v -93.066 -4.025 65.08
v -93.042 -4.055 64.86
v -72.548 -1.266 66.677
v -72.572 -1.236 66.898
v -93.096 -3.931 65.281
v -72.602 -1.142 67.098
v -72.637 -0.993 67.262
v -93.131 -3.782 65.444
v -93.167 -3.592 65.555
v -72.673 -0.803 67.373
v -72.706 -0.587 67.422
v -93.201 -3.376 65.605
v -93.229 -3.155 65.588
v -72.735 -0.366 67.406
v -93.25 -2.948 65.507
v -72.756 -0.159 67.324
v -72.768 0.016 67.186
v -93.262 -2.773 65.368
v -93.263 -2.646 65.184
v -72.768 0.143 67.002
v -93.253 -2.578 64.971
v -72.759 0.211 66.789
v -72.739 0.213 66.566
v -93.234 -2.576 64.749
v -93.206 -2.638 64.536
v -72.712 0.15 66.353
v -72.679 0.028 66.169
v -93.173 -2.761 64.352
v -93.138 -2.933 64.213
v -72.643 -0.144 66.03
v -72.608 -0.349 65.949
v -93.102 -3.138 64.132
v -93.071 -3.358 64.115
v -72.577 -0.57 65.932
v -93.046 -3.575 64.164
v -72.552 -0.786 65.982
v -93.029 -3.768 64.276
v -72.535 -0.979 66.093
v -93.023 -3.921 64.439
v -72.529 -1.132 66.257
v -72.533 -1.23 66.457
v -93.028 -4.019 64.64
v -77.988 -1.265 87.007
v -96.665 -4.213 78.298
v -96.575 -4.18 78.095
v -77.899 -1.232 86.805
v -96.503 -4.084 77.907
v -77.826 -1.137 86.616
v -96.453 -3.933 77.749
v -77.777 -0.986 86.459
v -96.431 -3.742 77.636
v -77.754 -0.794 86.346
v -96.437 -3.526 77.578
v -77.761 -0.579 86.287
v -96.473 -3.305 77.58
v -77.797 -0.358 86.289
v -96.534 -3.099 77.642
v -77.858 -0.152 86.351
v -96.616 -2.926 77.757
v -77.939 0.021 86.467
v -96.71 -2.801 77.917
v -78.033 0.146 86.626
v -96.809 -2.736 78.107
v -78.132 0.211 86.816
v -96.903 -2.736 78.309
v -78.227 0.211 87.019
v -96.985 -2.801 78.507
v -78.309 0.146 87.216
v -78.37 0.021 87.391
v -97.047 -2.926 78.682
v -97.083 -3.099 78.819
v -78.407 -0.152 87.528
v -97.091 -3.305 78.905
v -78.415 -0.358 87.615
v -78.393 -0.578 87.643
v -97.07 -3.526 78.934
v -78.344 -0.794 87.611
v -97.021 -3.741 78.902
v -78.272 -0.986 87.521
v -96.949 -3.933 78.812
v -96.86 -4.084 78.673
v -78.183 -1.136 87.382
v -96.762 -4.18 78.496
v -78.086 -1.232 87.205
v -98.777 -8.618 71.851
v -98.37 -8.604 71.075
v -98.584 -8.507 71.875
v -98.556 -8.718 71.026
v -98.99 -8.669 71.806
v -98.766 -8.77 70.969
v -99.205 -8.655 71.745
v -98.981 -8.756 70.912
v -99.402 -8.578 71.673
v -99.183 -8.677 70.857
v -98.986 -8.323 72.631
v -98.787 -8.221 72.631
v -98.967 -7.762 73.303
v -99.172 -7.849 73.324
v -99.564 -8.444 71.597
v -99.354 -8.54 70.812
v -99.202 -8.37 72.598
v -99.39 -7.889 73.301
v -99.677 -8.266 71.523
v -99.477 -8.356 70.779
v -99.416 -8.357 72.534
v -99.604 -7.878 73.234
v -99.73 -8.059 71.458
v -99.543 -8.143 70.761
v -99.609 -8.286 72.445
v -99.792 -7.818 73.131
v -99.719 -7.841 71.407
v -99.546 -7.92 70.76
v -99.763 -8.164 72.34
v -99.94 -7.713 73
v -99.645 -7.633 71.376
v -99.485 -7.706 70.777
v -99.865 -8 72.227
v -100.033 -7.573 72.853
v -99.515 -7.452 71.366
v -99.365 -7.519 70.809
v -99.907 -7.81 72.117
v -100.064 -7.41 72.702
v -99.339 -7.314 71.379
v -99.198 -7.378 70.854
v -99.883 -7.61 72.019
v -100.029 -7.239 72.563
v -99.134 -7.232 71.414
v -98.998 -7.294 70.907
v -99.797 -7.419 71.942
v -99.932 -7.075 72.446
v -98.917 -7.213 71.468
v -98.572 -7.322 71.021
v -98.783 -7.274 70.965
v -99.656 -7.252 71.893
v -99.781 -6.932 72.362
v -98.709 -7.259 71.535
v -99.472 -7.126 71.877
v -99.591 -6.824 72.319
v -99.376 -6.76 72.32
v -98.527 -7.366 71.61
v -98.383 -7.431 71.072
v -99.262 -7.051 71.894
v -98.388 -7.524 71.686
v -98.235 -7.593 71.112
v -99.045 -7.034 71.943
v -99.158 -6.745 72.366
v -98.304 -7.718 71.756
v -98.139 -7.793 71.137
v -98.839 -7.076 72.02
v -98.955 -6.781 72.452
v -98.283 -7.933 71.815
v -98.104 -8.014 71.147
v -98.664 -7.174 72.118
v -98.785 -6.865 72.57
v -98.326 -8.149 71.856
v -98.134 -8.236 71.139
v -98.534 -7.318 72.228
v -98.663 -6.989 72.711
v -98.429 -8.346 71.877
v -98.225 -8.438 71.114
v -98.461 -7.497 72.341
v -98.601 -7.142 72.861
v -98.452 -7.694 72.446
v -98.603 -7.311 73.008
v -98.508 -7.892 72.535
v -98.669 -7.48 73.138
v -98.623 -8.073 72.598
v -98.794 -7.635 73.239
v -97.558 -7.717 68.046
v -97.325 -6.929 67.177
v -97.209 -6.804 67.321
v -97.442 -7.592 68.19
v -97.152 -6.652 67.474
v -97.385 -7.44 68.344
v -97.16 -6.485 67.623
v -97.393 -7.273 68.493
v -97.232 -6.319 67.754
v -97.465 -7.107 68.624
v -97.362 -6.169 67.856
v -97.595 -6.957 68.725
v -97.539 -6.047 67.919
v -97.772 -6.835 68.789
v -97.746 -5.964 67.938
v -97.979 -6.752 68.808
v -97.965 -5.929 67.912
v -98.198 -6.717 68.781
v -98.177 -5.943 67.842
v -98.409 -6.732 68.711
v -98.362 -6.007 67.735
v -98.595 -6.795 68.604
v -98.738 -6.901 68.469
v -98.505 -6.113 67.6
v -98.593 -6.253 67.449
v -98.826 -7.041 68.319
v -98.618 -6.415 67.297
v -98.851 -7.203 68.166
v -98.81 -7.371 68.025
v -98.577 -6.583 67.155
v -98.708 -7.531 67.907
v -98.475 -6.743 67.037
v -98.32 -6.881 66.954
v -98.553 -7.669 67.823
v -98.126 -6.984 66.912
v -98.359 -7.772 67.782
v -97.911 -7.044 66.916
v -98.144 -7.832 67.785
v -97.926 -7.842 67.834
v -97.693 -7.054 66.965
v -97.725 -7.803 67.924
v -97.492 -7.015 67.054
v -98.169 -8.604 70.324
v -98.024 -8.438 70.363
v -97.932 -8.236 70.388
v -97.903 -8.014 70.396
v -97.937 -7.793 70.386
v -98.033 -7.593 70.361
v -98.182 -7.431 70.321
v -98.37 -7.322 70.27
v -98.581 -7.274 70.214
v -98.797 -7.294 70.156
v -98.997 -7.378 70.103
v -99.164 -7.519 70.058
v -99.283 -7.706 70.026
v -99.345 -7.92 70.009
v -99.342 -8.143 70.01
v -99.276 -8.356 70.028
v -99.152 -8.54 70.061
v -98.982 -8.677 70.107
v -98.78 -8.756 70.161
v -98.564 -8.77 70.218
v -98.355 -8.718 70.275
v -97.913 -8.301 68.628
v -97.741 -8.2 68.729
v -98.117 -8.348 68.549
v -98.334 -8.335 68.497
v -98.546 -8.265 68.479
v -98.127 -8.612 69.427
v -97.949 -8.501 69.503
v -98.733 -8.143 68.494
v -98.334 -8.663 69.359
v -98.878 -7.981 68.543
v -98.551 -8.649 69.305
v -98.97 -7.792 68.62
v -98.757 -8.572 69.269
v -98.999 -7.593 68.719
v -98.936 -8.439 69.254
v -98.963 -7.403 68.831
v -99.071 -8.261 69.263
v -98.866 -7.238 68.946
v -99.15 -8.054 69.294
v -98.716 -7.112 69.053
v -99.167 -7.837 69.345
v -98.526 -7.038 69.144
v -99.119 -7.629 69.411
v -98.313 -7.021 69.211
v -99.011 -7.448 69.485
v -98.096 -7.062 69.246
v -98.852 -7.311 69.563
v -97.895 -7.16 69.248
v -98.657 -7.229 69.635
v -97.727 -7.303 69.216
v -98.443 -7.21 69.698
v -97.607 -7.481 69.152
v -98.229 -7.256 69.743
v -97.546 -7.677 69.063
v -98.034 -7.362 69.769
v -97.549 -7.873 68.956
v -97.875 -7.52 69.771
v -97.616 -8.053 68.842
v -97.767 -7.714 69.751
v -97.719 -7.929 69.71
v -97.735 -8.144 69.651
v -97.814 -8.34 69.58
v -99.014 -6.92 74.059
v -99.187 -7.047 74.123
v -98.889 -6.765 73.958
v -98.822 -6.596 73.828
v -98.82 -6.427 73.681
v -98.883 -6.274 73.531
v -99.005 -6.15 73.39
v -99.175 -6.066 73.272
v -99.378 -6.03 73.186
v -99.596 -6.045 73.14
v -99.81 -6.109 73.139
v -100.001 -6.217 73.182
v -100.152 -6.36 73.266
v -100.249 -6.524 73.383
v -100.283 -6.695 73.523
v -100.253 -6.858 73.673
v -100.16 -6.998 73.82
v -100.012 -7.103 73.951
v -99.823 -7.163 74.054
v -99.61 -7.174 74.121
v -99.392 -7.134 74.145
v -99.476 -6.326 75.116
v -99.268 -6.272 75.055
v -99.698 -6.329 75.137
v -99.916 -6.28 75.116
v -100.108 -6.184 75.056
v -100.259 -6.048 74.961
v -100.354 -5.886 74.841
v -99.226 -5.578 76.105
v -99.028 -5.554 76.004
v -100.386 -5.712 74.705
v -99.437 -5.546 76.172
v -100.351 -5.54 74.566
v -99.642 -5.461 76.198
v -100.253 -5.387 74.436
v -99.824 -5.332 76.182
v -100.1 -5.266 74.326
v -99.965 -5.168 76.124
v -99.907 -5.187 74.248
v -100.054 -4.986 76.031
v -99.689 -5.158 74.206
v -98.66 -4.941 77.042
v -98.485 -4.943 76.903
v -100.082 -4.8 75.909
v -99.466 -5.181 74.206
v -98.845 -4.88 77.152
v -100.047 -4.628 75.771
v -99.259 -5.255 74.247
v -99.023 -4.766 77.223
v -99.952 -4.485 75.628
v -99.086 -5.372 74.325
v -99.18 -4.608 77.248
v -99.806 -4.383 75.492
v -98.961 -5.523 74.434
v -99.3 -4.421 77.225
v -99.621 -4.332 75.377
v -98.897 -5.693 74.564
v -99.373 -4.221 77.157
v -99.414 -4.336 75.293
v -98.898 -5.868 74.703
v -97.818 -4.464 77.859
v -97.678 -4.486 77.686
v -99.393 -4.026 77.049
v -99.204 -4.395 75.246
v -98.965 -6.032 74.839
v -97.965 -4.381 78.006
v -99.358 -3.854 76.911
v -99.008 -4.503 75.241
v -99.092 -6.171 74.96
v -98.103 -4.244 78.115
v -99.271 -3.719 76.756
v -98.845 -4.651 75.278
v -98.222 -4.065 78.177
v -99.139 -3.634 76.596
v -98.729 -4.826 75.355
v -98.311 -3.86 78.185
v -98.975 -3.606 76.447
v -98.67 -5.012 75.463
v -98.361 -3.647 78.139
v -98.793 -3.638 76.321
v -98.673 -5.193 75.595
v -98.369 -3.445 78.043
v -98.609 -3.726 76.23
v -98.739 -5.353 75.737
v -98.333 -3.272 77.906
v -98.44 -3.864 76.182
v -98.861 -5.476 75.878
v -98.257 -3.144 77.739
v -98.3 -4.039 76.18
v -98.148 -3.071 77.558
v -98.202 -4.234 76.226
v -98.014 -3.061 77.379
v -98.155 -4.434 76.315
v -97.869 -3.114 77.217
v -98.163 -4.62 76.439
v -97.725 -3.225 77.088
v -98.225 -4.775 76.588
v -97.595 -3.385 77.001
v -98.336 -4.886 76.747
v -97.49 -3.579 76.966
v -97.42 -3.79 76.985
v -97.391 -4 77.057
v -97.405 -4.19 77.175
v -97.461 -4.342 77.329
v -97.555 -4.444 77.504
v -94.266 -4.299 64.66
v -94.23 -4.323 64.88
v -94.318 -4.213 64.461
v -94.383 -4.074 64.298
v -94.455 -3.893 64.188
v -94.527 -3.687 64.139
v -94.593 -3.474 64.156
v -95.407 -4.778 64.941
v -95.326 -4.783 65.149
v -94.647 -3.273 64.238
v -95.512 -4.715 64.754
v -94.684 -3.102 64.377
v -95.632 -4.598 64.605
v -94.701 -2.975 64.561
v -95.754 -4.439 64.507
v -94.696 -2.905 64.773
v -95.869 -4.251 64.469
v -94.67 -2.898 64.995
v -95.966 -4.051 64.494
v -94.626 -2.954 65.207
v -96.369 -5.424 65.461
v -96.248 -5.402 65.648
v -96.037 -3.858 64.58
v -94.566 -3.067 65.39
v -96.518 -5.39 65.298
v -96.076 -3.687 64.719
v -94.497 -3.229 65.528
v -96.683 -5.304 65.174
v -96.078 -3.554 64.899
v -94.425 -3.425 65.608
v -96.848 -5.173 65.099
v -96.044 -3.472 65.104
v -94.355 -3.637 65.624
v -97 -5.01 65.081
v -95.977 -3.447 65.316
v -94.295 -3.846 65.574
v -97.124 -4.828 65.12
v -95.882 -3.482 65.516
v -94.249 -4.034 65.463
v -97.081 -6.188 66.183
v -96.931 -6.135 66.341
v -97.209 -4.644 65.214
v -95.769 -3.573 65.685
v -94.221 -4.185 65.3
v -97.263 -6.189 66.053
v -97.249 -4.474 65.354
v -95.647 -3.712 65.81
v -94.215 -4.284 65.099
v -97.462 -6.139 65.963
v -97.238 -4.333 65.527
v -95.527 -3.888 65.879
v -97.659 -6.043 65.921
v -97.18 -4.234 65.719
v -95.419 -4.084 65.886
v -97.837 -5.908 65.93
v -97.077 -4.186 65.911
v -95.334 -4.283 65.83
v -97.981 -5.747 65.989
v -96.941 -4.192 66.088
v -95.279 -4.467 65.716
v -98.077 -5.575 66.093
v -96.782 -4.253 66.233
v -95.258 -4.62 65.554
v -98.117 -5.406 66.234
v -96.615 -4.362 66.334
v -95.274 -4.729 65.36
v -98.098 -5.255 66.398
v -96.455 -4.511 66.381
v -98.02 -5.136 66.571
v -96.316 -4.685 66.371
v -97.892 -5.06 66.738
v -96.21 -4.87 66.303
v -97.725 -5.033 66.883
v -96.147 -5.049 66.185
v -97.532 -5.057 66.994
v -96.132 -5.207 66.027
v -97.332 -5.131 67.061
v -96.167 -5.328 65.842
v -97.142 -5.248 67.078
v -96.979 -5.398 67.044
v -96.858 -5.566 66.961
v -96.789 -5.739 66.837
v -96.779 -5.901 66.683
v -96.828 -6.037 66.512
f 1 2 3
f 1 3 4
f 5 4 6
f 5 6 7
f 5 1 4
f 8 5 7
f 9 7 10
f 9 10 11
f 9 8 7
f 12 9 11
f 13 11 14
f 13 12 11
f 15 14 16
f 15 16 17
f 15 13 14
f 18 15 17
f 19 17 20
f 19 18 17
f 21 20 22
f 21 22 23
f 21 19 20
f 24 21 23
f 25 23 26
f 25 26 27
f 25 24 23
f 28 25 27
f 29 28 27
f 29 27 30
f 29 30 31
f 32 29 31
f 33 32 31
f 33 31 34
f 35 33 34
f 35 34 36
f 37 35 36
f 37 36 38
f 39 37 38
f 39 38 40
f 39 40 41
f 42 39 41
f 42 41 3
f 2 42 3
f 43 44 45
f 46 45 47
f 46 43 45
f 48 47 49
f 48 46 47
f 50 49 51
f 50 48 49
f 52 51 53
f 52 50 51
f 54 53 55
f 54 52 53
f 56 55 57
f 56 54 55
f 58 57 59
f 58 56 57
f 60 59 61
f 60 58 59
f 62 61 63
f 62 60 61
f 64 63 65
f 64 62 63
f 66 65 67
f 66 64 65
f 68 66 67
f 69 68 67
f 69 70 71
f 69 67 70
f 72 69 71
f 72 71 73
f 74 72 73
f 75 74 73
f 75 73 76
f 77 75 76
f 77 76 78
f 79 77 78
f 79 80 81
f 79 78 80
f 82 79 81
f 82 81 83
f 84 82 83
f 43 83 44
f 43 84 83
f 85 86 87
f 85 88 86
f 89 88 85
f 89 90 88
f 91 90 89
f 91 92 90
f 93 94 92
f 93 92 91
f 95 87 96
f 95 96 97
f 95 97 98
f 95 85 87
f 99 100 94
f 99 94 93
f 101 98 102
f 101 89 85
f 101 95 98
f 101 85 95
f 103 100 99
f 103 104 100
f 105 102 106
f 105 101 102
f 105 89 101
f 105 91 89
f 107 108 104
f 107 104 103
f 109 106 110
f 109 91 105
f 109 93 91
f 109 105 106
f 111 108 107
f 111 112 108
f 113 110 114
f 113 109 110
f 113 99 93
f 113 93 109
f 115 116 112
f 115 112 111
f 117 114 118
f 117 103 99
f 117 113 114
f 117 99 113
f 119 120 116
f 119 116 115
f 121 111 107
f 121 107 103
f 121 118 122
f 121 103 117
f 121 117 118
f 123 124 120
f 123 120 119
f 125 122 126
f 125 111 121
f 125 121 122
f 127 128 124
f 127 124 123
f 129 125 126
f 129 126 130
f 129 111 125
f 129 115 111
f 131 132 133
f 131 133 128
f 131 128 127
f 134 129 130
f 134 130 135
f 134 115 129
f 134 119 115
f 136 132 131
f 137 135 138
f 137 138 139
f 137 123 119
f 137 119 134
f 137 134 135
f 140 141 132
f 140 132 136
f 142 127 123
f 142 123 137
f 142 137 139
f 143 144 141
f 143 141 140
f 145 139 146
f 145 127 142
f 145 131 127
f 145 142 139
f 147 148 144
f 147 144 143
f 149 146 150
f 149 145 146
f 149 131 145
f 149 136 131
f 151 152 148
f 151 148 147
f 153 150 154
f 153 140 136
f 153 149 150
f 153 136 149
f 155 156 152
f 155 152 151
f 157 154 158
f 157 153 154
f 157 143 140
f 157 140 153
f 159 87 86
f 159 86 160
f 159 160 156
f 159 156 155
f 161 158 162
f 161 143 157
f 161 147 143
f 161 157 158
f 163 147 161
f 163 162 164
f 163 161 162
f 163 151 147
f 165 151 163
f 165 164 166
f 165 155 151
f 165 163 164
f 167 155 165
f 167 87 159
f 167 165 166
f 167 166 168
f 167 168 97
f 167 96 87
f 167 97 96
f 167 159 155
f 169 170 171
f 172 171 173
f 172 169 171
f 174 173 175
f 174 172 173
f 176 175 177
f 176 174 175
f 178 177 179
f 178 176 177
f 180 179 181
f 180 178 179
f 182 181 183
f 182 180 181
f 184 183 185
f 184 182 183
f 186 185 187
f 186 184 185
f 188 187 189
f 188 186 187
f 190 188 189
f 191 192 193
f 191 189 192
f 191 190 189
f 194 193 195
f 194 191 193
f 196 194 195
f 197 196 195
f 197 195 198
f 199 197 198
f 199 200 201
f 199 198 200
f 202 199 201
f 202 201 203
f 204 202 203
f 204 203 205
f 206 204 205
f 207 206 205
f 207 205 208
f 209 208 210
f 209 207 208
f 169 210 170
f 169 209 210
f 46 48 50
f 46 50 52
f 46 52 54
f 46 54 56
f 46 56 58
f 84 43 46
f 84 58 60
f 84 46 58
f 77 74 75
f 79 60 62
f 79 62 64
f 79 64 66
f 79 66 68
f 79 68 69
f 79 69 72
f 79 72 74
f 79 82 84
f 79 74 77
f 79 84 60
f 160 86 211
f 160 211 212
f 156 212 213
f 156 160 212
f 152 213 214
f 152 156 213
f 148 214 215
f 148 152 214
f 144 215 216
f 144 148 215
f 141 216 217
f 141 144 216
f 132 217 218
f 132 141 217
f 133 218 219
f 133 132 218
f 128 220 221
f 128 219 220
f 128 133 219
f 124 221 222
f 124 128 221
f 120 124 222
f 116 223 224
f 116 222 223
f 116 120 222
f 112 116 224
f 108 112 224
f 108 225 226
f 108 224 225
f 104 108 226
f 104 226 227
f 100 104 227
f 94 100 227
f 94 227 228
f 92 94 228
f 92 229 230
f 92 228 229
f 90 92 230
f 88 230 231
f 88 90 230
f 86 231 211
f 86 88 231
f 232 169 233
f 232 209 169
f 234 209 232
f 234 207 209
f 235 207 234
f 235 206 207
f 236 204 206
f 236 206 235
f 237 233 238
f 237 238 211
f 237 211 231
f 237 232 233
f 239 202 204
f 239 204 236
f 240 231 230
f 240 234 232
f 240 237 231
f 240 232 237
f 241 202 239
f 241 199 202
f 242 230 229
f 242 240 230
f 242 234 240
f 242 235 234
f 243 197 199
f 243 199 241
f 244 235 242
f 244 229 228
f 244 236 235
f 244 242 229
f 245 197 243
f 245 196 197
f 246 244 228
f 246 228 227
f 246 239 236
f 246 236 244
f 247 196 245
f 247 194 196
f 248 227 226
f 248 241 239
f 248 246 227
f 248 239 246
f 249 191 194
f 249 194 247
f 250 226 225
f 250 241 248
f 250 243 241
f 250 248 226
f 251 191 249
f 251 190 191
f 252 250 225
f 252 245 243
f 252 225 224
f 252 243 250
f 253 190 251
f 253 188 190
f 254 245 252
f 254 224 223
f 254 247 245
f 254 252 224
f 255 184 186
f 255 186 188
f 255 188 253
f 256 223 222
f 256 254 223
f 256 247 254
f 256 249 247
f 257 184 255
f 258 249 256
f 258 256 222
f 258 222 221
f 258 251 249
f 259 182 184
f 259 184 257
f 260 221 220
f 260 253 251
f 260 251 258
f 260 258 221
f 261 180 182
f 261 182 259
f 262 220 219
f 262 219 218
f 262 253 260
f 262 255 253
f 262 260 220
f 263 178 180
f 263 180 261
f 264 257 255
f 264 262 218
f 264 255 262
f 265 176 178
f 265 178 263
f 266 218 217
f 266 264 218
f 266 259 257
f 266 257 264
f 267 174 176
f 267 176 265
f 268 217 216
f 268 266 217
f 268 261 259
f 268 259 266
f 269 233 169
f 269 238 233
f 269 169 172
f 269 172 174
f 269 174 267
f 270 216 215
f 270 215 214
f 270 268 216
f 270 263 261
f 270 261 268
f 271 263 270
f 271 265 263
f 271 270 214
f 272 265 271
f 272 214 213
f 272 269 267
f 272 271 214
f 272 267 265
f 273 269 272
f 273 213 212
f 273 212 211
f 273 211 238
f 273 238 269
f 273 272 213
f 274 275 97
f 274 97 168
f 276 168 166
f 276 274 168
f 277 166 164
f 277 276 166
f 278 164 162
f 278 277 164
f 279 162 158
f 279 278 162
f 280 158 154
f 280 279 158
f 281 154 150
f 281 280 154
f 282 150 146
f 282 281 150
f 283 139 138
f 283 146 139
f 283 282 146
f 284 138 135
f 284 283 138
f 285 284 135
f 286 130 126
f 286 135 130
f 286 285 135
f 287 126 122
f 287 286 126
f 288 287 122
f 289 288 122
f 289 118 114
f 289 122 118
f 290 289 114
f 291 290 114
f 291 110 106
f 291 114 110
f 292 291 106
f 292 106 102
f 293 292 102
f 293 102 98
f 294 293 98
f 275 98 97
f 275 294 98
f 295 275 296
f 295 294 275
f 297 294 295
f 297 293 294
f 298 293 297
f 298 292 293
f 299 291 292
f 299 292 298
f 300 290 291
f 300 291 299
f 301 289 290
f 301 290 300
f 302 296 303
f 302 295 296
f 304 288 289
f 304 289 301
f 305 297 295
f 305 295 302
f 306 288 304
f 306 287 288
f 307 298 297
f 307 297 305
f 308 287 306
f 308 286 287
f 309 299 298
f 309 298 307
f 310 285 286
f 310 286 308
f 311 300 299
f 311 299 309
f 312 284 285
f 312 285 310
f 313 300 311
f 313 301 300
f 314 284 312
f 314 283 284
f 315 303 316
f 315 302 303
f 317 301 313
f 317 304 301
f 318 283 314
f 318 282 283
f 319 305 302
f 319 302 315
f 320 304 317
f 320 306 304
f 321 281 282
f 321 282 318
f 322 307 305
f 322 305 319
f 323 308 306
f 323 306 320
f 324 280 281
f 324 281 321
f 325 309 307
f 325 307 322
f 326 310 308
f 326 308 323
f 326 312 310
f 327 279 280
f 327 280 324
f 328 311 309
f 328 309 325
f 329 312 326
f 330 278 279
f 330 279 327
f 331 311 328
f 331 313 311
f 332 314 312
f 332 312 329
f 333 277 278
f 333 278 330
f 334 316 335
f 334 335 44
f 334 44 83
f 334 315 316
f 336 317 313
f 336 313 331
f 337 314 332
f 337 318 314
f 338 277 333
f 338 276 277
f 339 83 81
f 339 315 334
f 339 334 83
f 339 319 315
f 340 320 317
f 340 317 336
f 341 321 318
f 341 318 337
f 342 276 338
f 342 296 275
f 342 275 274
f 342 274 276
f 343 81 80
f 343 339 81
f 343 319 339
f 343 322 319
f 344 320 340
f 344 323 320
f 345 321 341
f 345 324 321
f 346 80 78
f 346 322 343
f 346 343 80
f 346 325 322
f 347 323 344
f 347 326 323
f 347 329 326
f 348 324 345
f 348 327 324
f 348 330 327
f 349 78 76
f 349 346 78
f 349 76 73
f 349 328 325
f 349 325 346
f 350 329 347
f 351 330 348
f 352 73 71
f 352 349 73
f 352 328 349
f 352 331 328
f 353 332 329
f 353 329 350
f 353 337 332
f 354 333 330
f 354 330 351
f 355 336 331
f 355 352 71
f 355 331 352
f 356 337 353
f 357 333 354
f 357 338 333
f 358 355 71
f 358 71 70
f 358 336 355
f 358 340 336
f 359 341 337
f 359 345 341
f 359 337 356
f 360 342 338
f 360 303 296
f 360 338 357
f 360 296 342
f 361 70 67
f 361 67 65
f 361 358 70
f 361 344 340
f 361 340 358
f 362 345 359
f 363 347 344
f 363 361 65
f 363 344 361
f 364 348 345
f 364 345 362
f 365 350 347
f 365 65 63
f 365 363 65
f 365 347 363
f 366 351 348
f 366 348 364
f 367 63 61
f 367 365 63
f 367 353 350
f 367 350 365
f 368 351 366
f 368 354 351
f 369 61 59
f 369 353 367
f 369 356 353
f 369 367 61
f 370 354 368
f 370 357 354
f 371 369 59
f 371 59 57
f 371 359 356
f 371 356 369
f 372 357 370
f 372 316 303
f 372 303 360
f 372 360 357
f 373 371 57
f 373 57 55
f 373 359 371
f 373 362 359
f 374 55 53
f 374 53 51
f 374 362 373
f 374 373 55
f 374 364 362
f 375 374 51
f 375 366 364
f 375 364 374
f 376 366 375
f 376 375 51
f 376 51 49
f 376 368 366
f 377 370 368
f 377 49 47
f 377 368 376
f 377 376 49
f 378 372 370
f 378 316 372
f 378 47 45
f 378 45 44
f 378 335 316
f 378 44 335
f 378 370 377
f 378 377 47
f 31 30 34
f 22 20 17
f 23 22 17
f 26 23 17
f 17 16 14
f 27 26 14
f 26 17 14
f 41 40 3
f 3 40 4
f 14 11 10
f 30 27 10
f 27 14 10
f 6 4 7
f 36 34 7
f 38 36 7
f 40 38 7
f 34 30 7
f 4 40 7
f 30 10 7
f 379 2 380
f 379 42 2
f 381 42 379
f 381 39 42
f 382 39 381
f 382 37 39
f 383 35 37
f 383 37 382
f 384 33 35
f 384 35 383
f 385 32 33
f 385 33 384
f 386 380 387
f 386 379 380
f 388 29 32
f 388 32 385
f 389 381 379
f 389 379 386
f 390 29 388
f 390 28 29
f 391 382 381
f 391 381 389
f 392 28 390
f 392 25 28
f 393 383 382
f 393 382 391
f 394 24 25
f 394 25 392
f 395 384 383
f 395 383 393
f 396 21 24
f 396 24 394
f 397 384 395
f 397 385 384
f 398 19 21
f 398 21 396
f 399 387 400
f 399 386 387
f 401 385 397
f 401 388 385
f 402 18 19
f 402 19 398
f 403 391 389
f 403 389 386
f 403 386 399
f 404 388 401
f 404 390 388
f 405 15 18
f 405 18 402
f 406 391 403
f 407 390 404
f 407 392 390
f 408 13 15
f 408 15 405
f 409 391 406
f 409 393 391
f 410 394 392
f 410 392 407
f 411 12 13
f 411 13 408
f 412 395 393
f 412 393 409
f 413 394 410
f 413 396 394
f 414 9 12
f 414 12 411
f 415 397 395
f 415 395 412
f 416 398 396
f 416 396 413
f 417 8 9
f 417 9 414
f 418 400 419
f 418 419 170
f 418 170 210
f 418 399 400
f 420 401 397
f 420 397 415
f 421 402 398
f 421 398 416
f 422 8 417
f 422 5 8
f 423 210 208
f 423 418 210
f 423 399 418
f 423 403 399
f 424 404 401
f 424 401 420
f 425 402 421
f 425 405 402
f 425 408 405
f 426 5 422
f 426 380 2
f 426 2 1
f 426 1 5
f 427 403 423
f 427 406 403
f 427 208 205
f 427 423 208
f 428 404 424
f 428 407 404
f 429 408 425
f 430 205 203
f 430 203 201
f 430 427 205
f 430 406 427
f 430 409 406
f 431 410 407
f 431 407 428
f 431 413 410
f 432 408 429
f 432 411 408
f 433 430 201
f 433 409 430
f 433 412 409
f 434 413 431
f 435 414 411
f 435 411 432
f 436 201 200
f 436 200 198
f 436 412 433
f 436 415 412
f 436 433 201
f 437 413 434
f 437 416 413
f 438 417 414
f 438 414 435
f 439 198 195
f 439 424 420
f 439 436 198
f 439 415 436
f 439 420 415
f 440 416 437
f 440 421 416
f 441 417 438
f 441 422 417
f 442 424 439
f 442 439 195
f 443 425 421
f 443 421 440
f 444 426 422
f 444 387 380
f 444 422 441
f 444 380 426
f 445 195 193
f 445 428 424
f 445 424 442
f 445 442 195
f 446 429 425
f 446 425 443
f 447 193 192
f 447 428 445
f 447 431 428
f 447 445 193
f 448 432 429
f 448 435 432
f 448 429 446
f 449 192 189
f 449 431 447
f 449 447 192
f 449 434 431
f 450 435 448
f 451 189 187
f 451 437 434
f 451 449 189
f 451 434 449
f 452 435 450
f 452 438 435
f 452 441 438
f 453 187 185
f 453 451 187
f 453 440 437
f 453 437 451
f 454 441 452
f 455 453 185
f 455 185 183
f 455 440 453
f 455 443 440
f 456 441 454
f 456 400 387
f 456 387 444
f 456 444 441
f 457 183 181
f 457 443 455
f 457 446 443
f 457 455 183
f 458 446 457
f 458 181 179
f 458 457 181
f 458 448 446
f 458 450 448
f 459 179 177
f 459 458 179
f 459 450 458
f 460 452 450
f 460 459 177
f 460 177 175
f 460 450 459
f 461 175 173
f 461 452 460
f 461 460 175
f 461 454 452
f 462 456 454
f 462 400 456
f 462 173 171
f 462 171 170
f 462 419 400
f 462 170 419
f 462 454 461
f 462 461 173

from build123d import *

# Parameters (mm, degrees)
SWEEP1_PROFILE_R = 0.75


with BuildPart() as part:
    # Sweep1: sweep along a curve in space
    with BuildLine() as sweep1_path:
        Line((-96.760776121, -3.47025774, 78.252711823), (-78.084348541, -0.522963163, 86.961878631))
        ThreePointArc((-96.760776121, -3.47025774, 78.252711823), (-99.112397911, -4.596881054, 76.226314182), (-99.548244883, -6.60263734, 73.639294338))
        Line((-99.548244883, -6.60263734, 73.639294338), (-99.328473076, -7.317696757, 72.819094788))
        ThreePointArc((-98.82832928, -8.022963163, 70.95253273), (-99.09453566, -7.841136399, 71.946028463), (-99.328473076, -7.317696757, 72.819094788))
        Line((-98.627122104, -8.022963163, 70.201617327), (-98.82832928, -8.022963163, 70.95253273))
        ThreePointArc((-98.627122104, -8.022963163, 70.201617327), (-98.353918152, -7.831121447, 69.182006297), (-98.115655477, -7.280131794, 68.292797886))
        Line((-98.115655477, -7.280131794, 68.292797886), (-97.882684409, -6.49206537, 67.423338024))
        ThreePointArc((-93.143377561, -3.311786612, 64.859921351), (-96.209258102, -4.441131936, 65.426107931), (-97.882684409, -6.49206537, 67.423338024))
        Line((-93.143377561, -3.311786612, 64.859921351), (-72.649148593, -0.522963163, 66.677436279))
    # Sweep1 profile (on start of the path) → Sweep1 (sweep)
    with BuildSketch(Plane(origin=(-72.649148593, -0.522963163, 66.677436279), x_dir=(0.13483580164041467, -0.9908679561858819, 0), z_dir=(-0.9870642774001727, -0.1343182028271198, -0.08753703598916203))):
        Circle(SWEEP1_PROFILE_R)
    sweep(path=sweep1_path.line)


solid = part.part
